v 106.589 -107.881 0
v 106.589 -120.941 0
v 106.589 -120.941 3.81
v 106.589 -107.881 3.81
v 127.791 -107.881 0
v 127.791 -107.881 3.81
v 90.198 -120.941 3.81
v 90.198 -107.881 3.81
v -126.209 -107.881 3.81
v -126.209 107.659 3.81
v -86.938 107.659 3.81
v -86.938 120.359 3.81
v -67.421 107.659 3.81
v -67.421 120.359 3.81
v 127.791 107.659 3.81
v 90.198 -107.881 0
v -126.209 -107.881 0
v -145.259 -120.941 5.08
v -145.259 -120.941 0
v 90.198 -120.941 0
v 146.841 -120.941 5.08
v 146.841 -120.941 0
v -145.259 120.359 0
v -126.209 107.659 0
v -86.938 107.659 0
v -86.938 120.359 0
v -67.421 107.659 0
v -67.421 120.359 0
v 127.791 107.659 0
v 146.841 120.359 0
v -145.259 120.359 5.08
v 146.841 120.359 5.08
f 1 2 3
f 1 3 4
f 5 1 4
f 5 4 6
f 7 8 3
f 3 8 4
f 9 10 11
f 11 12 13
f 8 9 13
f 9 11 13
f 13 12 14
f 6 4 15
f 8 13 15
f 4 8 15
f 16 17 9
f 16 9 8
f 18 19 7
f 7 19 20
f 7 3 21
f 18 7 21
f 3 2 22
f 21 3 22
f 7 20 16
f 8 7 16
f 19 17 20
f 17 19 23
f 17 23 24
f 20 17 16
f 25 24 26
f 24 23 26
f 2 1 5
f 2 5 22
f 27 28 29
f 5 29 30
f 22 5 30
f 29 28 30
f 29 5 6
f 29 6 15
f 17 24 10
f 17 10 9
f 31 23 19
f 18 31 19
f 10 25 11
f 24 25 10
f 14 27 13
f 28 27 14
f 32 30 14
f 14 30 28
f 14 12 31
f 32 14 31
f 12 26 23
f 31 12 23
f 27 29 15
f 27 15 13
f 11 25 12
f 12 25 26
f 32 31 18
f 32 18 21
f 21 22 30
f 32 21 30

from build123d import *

# Parameters (mm, degrees)
F0_W     = 19.5166560506
F0_H     = 12.7
F0_W_2   = 16.3915466189
F0_H_2   = 13.060019505
F1_DEPTH = 5.08
F0_H_3   = 2.5634752994
F2_DEPTH = 5.08
F3_DEPTH = 3.81
F4_DEPTH = 3.81


with BuildPart() as f1:
    # F0 (on Top) → F1 (new body)
    with BuildSketch(Plane.XY):
        Polygon((-86.9376676773, 107.6591225748), (-86.9376676773, 120.3591225748), (-145.258925468, 120.3591225748), (-145.258925468, -120.9408774252), (90.1978743578, -120.9408774252), (90.1978743578, -107.8808579201), (-126.208925468, -107.8808579201), (-126.208925468, -44.3808579201), (-126.208925468, 107.6591225748), align=None)
        Polygon((146.841074532, -120.9408774252), (146.841074532, 120.3591225748), (-67.4210116267, 120.3591225748), (-67.4210116267, 107.6591225748), (127.791074532, 107.6591225748), (127.791074532, -107.8808579201), (106.5894209767, -107.8808579201), (106.5894209767, -120.9408774252), align=None)
        with Locations((-77.179339652, 114.0091225748)):
            Rectangle(F0_W, F0_H)
        with Locations((98.3936476673, -114.4108676727)):
            Rectangle(F0_W_2, F0_H_2)
    extrude(amount=F1_DEPTH)

    # F0 (on Top) → F2 (join)
    with BuildSketch(Plane.XY):
        Polygon((127.791074532, 107.6591225748), (-67.4210116267, 107.6591225748), (-67.4210116267, 105.0956472754), (-86.9376676773, 105.0956472754), (-86.9376676773, 107.6591225748), (-126.208925468, 107.6591225748), (-126.208925468, -44.3808579201), (-126.208925468, -107.8808579201), (90.1978743578, -107.8808579201), (106.5894209767, -107.8808579201), (127.791074532, -107.8808579201), align=None)
        with Locations((-77.179339652, 106.3773849251)):
            Rectangle(F0_W, F0_H_3)
    extrude(amount=F2_DEPTH)

    # F0 (on Top) → F3 (cut)
    with BuildSketch(Plane.XY):
        Polygon((127.791074532, 107.6591225748), (-67.4210116267, 107.6591225748), (-67.4210116267, 105.0956472754), (-86.9376676773, 105.0956472754), (-86.9376676773, 107.6591225748), (-126.208925468, 107.6591225748), (-126.208925468, -44.3808579201), (-126.208925468, -107.8808579201), (90.1978743578, -107.8808579201), (106.5894209767, -107.8808579201), (127.791074532, -107.8808579201), align=None)
        with Locations((-77.179339652, 106.3773849251)):
            Rectangle(F0_W, F0_H_3)
    extrude(amount=F3_DEPTH, mode=Mode.SUBTRACT)

    # F0 (on Top) → F4 (cut)
    with BuildSketch(Plane.XY):
        with Locations((98.3936476673, -114.4108676727)):
            Rectangle(F0_W_2, F0_H_2)
        with Locations((-77.179339652, 114.0091225748)):
            Rectangle(F0_W, F0_H)
    extrude(amount=F4_DEPTH, mode=Mode.SUBTRACT)


solid = f1.part
